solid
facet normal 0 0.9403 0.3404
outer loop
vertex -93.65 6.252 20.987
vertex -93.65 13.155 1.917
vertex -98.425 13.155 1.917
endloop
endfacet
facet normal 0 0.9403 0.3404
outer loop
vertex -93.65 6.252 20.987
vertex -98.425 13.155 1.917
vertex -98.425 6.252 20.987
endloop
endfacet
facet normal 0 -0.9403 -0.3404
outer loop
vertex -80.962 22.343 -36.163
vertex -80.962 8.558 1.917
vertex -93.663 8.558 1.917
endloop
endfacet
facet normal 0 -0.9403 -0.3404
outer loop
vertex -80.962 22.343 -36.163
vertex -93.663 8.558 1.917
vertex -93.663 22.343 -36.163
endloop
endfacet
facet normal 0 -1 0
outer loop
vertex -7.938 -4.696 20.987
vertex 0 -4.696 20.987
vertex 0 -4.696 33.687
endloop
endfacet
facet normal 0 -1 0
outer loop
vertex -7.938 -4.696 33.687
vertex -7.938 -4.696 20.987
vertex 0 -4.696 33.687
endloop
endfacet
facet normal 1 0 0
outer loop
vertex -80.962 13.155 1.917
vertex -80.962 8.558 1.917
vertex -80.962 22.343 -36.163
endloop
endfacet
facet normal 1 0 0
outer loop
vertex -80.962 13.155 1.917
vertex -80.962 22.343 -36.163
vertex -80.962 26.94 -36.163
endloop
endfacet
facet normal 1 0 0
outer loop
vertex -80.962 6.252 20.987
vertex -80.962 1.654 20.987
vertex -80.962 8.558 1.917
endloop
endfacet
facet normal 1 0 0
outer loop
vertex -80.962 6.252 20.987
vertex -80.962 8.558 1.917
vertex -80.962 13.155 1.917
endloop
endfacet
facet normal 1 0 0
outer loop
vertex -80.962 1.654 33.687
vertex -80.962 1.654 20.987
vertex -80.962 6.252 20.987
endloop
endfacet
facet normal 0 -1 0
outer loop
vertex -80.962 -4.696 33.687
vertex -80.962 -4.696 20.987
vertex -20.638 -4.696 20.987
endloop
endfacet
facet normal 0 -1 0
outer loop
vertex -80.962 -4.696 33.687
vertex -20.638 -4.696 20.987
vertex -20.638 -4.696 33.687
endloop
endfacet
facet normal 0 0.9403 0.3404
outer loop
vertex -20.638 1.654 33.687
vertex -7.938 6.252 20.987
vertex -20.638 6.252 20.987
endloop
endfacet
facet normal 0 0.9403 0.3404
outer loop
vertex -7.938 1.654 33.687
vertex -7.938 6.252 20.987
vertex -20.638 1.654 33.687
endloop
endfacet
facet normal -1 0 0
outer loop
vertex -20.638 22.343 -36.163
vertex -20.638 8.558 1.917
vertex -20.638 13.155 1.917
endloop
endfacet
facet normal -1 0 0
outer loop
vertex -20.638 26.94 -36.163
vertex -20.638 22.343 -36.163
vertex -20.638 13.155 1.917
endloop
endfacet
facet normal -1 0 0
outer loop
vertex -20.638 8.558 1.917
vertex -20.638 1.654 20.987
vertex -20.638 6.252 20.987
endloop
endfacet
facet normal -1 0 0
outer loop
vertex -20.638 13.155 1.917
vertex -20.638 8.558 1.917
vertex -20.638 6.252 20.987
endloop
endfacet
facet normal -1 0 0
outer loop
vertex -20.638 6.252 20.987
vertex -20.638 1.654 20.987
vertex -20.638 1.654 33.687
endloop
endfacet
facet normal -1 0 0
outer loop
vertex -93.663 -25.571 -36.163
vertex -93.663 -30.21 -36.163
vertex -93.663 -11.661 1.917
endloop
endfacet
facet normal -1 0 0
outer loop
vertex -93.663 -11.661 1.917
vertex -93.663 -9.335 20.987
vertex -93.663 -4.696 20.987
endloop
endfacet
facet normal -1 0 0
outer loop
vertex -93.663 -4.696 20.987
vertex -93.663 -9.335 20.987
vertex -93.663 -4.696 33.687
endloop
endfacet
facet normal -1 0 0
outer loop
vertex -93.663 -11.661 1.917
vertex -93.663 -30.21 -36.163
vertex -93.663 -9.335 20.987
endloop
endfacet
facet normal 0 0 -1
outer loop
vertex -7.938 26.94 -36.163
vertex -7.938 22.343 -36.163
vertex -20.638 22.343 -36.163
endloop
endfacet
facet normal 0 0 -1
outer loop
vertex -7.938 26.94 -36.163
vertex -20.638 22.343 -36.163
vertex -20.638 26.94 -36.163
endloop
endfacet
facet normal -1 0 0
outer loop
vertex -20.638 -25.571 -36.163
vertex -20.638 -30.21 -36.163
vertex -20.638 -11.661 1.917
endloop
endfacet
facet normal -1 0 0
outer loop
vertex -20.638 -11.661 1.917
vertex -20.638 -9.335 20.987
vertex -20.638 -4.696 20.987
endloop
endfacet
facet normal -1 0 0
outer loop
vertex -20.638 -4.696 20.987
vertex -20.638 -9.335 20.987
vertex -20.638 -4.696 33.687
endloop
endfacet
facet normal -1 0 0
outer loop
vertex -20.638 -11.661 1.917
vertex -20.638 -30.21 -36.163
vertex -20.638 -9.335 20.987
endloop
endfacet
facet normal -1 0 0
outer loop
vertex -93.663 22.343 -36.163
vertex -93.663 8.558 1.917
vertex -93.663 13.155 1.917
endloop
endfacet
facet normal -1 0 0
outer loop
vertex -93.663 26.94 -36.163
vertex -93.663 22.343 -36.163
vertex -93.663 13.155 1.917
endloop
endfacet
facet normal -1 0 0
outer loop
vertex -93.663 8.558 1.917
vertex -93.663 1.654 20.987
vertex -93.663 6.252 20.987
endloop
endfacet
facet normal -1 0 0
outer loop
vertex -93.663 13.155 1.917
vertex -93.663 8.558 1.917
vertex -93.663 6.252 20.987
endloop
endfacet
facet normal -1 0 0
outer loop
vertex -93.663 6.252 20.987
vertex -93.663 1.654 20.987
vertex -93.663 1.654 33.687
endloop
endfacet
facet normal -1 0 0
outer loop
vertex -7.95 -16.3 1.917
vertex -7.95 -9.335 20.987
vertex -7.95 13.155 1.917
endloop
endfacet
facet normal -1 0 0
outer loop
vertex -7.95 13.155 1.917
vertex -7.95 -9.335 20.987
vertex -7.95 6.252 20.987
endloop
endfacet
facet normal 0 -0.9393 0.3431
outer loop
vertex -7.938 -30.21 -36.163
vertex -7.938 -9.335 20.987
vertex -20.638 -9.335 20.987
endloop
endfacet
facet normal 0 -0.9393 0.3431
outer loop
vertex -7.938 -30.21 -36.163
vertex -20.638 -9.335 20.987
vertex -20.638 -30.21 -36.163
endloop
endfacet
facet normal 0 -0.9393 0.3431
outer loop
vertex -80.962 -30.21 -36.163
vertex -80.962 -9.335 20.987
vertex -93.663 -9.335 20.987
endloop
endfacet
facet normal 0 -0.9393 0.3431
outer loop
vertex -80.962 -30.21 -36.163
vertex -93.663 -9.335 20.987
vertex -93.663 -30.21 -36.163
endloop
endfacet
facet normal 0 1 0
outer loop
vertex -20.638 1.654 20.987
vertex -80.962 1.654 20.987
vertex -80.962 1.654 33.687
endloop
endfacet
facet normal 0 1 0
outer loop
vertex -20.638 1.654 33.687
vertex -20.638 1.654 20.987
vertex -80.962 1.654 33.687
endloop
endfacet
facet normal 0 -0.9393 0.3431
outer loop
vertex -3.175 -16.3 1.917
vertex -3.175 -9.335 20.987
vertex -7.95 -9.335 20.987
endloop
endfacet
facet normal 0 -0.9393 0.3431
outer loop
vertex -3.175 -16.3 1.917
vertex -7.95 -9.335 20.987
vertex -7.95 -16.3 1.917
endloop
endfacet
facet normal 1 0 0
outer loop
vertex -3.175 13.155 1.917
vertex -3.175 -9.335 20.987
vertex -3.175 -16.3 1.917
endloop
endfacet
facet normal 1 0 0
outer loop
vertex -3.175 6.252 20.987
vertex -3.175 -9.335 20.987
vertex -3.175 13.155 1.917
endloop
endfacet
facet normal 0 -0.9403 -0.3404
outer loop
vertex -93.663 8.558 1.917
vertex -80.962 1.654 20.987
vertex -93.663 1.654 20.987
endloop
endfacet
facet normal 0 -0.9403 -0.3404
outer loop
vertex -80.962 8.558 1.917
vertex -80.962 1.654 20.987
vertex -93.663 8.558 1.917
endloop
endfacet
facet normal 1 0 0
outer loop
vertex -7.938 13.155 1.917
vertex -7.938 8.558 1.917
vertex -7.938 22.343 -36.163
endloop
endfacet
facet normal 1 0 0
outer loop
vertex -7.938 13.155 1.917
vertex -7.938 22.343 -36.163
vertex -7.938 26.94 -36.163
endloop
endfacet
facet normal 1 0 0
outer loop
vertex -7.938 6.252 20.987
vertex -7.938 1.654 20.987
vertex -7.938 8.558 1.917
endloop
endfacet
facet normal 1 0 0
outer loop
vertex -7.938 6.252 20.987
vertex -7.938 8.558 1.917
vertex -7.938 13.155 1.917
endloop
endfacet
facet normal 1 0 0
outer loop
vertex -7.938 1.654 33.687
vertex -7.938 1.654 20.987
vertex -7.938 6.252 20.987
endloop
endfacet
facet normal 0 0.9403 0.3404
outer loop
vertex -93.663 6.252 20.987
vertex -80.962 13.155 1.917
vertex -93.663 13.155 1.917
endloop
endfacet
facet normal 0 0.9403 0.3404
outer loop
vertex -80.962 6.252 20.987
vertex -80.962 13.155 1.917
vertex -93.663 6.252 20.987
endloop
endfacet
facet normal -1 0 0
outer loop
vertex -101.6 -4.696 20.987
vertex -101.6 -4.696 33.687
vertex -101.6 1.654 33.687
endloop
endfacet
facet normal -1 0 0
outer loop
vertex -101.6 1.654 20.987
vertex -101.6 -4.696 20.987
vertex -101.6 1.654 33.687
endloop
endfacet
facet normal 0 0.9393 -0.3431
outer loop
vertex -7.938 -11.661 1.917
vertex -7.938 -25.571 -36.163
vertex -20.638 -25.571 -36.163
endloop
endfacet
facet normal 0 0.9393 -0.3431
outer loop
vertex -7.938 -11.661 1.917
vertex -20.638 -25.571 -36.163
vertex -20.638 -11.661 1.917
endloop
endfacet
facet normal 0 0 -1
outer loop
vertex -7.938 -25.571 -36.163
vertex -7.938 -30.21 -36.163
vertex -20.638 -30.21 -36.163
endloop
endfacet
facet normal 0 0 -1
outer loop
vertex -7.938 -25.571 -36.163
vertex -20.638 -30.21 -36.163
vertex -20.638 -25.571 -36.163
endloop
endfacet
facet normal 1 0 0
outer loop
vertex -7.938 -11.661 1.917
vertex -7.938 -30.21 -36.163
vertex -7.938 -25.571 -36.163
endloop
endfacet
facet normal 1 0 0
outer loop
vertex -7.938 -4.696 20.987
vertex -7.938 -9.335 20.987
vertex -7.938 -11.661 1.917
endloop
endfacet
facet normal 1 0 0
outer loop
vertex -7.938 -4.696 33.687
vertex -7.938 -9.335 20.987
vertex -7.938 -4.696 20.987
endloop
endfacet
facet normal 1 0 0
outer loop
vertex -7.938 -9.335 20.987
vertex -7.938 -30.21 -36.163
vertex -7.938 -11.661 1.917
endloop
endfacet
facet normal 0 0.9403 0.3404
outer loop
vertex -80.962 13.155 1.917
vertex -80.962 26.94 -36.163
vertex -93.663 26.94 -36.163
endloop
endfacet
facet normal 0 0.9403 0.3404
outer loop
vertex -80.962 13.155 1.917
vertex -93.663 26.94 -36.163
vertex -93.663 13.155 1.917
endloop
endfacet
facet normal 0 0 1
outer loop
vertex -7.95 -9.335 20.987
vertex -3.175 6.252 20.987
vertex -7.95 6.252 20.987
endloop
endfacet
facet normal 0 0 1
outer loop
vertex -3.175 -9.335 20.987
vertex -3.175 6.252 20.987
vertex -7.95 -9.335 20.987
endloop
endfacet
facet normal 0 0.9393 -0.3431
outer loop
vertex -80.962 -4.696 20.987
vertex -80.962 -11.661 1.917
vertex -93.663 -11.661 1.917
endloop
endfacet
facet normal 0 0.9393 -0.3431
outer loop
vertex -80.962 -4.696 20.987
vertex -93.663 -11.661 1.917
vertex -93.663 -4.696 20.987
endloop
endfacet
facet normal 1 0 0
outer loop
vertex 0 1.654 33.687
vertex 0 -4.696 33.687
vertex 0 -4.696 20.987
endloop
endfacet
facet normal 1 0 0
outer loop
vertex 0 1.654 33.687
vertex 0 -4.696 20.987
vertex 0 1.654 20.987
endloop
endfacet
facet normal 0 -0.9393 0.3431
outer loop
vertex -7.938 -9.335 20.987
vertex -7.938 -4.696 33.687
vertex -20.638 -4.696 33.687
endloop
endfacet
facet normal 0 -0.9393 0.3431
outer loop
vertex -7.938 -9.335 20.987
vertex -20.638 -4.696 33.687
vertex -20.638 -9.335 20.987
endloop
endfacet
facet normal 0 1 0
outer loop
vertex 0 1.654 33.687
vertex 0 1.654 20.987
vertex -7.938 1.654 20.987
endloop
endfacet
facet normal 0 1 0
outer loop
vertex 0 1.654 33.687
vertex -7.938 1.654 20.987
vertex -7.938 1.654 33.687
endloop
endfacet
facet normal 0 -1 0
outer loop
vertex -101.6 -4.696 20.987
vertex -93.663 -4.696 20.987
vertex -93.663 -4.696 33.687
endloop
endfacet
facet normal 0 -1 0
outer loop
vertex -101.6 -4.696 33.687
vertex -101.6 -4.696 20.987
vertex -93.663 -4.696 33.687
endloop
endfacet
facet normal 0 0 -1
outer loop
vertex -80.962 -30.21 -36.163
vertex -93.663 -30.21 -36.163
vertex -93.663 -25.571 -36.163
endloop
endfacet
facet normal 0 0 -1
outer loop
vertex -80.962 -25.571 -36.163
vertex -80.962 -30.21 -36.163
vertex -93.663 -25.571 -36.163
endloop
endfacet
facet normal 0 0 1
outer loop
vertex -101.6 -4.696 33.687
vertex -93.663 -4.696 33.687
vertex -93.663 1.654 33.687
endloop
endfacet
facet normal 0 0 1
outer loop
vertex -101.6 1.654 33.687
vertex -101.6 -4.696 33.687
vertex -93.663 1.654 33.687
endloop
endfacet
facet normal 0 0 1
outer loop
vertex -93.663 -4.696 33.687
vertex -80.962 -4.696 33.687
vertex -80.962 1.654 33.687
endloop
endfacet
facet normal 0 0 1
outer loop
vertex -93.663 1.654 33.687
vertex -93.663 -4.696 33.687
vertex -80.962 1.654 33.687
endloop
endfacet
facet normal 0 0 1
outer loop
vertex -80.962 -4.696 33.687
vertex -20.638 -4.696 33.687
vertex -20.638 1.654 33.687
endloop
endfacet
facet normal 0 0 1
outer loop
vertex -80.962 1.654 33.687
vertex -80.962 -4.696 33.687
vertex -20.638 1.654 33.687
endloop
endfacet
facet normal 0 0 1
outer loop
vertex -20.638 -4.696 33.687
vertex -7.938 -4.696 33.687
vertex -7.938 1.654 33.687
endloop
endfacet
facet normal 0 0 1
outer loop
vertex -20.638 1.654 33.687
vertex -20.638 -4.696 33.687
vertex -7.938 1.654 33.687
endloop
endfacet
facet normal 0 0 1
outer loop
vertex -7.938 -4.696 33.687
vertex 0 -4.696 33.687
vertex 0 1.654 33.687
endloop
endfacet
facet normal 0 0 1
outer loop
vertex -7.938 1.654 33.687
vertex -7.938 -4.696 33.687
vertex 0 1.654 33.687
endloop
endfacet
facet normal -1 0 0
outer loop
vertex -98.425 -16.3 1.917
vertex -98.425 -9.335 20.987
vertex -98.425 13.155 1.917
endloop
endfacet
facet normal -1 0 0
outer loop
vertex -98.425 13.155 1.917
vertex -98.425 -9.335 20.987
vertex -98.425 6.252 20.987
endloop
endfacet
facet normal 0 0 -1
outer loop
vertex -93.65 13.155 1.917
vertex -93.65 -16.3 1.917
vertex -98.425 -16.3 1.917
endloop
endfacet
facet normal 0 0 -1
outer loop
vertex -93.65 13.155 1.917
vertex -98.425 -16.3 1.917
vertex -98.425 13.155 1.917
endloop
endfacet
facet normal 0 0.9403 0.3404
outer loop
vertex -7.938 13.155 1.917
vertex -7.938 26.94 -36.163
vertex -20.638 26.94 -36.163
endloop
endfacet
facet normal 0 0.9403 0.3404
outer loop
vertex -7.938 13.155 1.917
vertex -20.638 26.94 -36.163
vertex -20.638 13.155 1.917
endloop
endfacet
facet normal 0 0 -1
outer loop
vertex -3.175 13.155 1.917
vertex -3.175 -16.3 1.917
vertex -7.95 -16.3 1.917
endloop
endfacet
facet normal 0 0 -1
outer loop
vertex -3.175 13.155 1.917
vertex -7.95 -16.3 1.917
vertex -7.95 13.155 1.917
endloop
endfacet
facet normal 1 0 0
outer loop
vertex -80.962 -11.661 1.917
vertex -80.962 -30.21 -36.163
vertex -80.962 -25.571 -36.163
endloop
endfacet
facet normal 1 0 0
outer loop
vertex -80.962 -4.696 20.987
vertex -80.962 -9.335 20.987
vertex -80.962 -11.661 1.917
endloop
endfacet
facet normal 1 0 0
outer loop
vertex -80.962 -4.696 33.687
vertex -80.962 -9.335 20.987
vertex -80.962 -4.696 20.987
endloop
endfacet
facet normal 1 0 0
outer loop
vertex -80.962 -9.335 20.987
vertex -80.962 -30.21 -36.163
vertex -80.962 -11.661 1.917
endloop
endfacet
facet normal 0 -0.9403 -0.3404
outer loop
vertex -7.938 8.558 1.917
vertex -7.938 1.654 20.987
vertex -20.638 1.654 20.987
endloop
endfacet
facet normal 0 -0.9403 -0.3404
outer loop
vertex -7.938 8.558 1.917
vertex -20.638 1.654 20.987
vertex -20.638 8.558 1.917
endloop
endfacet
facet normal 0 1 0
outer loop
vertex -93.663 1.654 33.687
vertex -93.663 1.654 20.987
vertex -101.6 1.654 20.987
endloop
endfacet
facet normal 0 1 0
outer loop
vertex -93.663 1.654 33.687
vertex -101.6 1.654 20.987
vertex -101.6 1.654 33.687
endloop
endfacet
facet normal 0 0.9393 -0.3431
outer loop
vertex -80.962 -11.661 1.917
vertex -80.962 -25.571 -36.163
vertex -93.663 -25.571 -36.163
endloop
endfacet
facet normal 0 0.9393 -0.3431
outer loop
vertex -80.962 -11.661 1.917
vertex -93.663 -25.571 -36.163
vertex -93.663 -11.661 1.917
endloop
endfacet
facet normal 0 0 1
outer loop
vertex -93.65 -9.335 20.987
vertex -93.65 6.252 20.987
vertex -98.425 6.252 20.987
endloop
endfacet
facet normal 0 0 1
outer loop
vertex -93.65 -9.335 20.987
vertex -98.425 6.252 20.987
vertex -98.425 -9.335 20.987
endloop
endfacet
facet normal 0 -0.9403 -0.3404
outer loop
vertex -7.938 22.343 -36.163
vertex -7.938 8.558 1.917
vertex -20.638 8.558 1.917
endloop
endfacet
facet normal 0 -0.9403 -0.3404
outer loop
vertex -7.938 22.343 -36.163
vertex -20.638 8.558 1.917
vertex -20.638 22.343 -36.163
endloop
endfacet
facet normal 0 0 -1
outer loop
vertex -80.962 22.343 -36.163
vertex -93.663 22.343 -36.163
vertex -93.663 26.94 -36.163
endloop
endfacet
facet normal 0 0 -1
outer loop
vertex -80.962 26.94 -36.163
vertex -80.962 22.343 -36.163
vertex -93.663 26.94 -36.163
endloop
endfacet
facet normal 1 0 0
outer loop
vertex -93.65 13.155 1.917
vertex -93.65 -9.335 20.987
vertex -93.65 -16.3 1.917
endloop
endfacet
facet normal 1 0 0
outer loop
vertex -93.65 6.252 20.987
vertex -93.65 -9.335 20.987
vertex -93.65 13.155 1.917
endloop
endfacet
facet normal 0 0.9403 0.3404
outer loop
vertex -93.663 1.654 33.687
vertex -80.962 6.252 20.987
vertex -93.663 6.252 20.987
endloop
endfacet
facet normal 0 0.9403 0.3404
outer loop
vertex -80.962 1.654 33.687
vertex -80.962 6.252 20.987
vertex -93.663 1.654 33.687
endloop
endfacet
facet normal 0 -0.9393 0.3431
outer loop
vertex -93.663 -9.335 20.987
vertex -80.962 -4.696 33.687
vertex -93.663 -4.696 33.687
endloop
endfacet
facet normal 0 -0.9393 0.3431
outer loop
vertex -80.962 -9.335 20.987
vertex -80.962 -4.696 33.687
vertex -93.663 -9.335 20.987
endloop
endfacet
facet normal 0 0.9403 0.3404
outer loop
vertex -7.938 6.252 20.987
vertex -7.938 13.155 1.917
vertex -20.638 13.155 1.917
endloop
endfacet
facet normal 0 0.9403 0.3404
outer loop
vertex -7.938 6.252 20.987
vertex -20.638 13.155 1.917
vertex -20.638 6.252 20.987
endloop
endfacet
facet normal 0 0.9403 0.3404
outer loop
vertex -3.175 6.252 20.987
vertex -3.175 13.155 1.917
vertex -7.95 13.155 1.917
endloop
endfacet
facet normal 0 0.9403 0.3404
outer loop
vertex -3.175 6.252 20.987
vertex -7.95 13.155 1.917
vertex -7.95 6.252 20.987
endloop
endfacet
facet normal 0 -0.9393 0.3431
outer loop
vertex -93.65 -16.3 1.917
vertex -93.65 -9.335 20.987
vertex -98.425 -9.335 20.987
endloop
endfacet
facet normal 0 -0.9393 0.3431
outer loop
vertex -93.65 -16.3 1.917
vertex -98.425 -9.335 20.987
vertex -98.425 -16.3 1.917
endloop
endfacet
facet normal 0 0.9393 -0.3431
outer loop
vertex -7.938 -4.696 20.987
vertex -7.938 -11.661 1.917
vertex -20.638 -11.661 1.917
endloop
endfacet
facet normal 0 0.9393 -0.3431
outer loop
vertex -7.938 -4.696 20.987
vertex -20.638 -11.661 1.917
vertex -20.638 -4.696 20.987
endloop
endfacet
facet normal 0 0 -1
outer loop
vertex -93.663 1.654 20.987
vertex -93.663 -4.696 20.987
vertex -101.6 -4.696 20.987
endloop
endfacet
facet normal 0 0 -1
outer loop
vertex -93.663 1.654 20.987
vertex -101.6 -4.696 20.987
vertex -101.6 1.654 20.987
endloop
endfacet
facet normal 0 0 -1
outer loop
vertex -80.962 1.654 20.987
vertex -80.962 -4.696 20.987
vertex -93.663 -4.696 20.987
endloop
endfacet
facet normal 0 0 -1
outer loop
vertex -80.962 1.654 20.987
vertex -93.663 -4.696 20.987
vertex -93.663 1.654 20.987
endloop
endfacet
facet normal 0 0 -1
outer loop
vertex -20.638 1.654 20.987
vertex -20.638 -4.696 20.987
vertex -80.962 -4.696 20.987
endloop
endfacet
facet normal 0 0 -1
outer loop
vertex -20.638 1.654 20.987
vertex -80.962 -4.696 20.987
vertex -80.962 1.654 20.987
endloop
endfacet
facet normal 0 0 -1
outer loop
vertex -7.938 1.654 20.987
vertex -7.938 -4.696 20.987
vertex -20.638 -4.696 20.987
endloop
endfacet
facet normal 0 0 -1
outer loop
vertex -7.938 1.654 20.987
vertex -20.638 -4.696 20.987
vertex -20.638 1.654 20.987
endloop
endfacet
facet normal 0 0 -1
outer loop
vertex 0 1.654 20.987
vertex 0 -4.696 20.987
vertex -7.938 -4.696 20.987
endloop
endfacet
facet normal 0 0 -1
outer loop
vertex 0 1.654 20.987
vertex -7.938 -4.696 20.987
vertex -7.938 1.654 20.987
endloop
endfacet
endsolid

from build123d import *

# Parameters (mm, degrees)
F0_W     = 6.35
F0_H     = 12.7
F1_DEPTH = 101.6
F2_START = -7.9375
F2_DEPTH = 12.7
F3_START = -80.9625
F3_DEPTH = 12.7
F4_START = -3.175
F4_DEPTH = 4.7752
F5_START = -93.6498
F5_DEPTH = 4.7752


with BuildPart() as f1:
    # F0 (on Right) → F1 (new body)
    with BuildSketch(Plane.YZ):
        with Locations((-1.5206841388, 27.3374924831)):
            Rectangle(F0_W, F0_H)
    extrude(amount=-F1_DEPTH)

    # F0 (on Right) → F2 (join)
    with BuildSketch(Plane.YZ.offset(F2_START)):
        Polygon((-25.5710205025, -36.1625075169), (-11.6614542497, 1.9174399149), (-16.300417886, 1.9174399149), (-30.2099841388, -36.1625075169), align=None)
        Polygon((13.1550748908, 1.9174399149), (8.5576748908, 1.9174399149), (22.3426158612, -36.1625075169), (26.9400158612, -36.1625075169), align=None)
        Polygon((-4.6956841388, 20.9874924831), (-4.6956841388, 33.6874924831), (-9.3346477752, 20.9874924831), align=None)
        Polygon((6.2517158612, 20.9874924831), (1.6543158612, 33.6874924831), (1.6543158612, 20.9874924831), align=None)
        with Locations((-1.5206841388, 27.3374924831)):
            Rectangle(F0_W, F0_H)
        Polygon((-11.6614542497, 1.9174399149), (-4.6956841388, 20.9874924831), (-9.3346477752, 20.9874924831), (-16.300417886, 1.9174399149), align=None)
        Polygon((6.2517158612, 20.9874924831), (1.6543158612, 20.9874924831), (8.5576748908, 1.9174399149), (13.1550748908, 1.9174399149), align=None)
    extrude(amount=-F2_DEPTH)

    # F0 (on Right) → F3 (join)
    with BuildSketch(Plane.YZ.offset(F3_START)):
        Polygon((-25.5710205025, -36.1625075169), (-11.6614542497, 1.9174399149), (-16.300417886, 1.9174399149), (-30.2099841388, -36.1625075169), align=None)
        Polygon((13.1550748908, 1.9174399149), (8.5576748908, 1.9174399149), (22.3426158612, -36.1625075169), (26.9400158612, -36.1625075169), align=None)
        Polygon((6.2517158612, 20.9874924831), (1.6543158612, 20.9874924831), (8.5576748908, 1.9174399149), (13.1550748908, 1.9174399149), align=None)
        Polygon((-11.6614542497, 1.9174399149), (-4.6956841388, 20.9874924831), (-9.3346477752, 20.9874924831), (-16.300417886, 1.9174399149), align=None)
        Polygon((-4.6956841388, 20.9874924831), (-4.6956841388, 33.6874924831), (-9.3346477752, 20.9874924831), align=None)
        Polygon((6.2517158612, 20.9874924831), (1.6543158612, 33.6874924831), (1.6543158612, 20.9874924831), align=None)
    extrude(amount=-F3_DEPTH)


with BuildPart() as f4:
    # F0 (on Right) → F4 (new body)
    with BuildSketch(Plane.YZ.offset(F4_START)):
        Polygon((1.6543158612, 20.9874924831), (-4.6956841388, 20.9874924831), (-11.6614542497, 1.9174399149), (6.1924366594, 1.9174399149), (8.5576748908, 1.9174399149), align=None)
        Polygon((-11.6614542497, 1.9174399149), (-4.6956841388, 20.9874924831), (-9.3346477752, 20.9874924831), (-16.300417886, 1.9174399149), align=None)
        Polygon((6.2517158612, 20.9874924831), (1.6543158612, 20.9874924831), (8.5576748908, 1.9174399149), (13.1550748908, 1.9174399149), align=None)
    extrude(amount=-F4_DEPTH)


with BuildPart() as f5:
    # F0 (on Right) → F5 (new body)
    with BuildSketch(Plane.YZ.offset(F5_START)):
        Polygon((-11.6614542497, 1.9174399149), (-4.6956841388, 20.9874924831), (-9.3346477752, 20.9874924831), (-16.300417886, 1.9174399149), align=None)
        Polygon((1.6543158612, 20.9874924831), (-4.6956841388, 20.9874924831), (-11.6614542497, 1.9174399149), (6.1924366594, 1.9174399149), (8.5576748908, 1.9174399149), align=None)
        Polygon((6.2517158612, 20.9874924831), (1.6543158612, 20.9874924831), (8.5576748908, 1.9174399149), (13.1550748908, 1.9174399149), align=None)
    extrude(amount=-F5_DEPTH)


solid = Compound([f1.part, f4.part, f5.part])
